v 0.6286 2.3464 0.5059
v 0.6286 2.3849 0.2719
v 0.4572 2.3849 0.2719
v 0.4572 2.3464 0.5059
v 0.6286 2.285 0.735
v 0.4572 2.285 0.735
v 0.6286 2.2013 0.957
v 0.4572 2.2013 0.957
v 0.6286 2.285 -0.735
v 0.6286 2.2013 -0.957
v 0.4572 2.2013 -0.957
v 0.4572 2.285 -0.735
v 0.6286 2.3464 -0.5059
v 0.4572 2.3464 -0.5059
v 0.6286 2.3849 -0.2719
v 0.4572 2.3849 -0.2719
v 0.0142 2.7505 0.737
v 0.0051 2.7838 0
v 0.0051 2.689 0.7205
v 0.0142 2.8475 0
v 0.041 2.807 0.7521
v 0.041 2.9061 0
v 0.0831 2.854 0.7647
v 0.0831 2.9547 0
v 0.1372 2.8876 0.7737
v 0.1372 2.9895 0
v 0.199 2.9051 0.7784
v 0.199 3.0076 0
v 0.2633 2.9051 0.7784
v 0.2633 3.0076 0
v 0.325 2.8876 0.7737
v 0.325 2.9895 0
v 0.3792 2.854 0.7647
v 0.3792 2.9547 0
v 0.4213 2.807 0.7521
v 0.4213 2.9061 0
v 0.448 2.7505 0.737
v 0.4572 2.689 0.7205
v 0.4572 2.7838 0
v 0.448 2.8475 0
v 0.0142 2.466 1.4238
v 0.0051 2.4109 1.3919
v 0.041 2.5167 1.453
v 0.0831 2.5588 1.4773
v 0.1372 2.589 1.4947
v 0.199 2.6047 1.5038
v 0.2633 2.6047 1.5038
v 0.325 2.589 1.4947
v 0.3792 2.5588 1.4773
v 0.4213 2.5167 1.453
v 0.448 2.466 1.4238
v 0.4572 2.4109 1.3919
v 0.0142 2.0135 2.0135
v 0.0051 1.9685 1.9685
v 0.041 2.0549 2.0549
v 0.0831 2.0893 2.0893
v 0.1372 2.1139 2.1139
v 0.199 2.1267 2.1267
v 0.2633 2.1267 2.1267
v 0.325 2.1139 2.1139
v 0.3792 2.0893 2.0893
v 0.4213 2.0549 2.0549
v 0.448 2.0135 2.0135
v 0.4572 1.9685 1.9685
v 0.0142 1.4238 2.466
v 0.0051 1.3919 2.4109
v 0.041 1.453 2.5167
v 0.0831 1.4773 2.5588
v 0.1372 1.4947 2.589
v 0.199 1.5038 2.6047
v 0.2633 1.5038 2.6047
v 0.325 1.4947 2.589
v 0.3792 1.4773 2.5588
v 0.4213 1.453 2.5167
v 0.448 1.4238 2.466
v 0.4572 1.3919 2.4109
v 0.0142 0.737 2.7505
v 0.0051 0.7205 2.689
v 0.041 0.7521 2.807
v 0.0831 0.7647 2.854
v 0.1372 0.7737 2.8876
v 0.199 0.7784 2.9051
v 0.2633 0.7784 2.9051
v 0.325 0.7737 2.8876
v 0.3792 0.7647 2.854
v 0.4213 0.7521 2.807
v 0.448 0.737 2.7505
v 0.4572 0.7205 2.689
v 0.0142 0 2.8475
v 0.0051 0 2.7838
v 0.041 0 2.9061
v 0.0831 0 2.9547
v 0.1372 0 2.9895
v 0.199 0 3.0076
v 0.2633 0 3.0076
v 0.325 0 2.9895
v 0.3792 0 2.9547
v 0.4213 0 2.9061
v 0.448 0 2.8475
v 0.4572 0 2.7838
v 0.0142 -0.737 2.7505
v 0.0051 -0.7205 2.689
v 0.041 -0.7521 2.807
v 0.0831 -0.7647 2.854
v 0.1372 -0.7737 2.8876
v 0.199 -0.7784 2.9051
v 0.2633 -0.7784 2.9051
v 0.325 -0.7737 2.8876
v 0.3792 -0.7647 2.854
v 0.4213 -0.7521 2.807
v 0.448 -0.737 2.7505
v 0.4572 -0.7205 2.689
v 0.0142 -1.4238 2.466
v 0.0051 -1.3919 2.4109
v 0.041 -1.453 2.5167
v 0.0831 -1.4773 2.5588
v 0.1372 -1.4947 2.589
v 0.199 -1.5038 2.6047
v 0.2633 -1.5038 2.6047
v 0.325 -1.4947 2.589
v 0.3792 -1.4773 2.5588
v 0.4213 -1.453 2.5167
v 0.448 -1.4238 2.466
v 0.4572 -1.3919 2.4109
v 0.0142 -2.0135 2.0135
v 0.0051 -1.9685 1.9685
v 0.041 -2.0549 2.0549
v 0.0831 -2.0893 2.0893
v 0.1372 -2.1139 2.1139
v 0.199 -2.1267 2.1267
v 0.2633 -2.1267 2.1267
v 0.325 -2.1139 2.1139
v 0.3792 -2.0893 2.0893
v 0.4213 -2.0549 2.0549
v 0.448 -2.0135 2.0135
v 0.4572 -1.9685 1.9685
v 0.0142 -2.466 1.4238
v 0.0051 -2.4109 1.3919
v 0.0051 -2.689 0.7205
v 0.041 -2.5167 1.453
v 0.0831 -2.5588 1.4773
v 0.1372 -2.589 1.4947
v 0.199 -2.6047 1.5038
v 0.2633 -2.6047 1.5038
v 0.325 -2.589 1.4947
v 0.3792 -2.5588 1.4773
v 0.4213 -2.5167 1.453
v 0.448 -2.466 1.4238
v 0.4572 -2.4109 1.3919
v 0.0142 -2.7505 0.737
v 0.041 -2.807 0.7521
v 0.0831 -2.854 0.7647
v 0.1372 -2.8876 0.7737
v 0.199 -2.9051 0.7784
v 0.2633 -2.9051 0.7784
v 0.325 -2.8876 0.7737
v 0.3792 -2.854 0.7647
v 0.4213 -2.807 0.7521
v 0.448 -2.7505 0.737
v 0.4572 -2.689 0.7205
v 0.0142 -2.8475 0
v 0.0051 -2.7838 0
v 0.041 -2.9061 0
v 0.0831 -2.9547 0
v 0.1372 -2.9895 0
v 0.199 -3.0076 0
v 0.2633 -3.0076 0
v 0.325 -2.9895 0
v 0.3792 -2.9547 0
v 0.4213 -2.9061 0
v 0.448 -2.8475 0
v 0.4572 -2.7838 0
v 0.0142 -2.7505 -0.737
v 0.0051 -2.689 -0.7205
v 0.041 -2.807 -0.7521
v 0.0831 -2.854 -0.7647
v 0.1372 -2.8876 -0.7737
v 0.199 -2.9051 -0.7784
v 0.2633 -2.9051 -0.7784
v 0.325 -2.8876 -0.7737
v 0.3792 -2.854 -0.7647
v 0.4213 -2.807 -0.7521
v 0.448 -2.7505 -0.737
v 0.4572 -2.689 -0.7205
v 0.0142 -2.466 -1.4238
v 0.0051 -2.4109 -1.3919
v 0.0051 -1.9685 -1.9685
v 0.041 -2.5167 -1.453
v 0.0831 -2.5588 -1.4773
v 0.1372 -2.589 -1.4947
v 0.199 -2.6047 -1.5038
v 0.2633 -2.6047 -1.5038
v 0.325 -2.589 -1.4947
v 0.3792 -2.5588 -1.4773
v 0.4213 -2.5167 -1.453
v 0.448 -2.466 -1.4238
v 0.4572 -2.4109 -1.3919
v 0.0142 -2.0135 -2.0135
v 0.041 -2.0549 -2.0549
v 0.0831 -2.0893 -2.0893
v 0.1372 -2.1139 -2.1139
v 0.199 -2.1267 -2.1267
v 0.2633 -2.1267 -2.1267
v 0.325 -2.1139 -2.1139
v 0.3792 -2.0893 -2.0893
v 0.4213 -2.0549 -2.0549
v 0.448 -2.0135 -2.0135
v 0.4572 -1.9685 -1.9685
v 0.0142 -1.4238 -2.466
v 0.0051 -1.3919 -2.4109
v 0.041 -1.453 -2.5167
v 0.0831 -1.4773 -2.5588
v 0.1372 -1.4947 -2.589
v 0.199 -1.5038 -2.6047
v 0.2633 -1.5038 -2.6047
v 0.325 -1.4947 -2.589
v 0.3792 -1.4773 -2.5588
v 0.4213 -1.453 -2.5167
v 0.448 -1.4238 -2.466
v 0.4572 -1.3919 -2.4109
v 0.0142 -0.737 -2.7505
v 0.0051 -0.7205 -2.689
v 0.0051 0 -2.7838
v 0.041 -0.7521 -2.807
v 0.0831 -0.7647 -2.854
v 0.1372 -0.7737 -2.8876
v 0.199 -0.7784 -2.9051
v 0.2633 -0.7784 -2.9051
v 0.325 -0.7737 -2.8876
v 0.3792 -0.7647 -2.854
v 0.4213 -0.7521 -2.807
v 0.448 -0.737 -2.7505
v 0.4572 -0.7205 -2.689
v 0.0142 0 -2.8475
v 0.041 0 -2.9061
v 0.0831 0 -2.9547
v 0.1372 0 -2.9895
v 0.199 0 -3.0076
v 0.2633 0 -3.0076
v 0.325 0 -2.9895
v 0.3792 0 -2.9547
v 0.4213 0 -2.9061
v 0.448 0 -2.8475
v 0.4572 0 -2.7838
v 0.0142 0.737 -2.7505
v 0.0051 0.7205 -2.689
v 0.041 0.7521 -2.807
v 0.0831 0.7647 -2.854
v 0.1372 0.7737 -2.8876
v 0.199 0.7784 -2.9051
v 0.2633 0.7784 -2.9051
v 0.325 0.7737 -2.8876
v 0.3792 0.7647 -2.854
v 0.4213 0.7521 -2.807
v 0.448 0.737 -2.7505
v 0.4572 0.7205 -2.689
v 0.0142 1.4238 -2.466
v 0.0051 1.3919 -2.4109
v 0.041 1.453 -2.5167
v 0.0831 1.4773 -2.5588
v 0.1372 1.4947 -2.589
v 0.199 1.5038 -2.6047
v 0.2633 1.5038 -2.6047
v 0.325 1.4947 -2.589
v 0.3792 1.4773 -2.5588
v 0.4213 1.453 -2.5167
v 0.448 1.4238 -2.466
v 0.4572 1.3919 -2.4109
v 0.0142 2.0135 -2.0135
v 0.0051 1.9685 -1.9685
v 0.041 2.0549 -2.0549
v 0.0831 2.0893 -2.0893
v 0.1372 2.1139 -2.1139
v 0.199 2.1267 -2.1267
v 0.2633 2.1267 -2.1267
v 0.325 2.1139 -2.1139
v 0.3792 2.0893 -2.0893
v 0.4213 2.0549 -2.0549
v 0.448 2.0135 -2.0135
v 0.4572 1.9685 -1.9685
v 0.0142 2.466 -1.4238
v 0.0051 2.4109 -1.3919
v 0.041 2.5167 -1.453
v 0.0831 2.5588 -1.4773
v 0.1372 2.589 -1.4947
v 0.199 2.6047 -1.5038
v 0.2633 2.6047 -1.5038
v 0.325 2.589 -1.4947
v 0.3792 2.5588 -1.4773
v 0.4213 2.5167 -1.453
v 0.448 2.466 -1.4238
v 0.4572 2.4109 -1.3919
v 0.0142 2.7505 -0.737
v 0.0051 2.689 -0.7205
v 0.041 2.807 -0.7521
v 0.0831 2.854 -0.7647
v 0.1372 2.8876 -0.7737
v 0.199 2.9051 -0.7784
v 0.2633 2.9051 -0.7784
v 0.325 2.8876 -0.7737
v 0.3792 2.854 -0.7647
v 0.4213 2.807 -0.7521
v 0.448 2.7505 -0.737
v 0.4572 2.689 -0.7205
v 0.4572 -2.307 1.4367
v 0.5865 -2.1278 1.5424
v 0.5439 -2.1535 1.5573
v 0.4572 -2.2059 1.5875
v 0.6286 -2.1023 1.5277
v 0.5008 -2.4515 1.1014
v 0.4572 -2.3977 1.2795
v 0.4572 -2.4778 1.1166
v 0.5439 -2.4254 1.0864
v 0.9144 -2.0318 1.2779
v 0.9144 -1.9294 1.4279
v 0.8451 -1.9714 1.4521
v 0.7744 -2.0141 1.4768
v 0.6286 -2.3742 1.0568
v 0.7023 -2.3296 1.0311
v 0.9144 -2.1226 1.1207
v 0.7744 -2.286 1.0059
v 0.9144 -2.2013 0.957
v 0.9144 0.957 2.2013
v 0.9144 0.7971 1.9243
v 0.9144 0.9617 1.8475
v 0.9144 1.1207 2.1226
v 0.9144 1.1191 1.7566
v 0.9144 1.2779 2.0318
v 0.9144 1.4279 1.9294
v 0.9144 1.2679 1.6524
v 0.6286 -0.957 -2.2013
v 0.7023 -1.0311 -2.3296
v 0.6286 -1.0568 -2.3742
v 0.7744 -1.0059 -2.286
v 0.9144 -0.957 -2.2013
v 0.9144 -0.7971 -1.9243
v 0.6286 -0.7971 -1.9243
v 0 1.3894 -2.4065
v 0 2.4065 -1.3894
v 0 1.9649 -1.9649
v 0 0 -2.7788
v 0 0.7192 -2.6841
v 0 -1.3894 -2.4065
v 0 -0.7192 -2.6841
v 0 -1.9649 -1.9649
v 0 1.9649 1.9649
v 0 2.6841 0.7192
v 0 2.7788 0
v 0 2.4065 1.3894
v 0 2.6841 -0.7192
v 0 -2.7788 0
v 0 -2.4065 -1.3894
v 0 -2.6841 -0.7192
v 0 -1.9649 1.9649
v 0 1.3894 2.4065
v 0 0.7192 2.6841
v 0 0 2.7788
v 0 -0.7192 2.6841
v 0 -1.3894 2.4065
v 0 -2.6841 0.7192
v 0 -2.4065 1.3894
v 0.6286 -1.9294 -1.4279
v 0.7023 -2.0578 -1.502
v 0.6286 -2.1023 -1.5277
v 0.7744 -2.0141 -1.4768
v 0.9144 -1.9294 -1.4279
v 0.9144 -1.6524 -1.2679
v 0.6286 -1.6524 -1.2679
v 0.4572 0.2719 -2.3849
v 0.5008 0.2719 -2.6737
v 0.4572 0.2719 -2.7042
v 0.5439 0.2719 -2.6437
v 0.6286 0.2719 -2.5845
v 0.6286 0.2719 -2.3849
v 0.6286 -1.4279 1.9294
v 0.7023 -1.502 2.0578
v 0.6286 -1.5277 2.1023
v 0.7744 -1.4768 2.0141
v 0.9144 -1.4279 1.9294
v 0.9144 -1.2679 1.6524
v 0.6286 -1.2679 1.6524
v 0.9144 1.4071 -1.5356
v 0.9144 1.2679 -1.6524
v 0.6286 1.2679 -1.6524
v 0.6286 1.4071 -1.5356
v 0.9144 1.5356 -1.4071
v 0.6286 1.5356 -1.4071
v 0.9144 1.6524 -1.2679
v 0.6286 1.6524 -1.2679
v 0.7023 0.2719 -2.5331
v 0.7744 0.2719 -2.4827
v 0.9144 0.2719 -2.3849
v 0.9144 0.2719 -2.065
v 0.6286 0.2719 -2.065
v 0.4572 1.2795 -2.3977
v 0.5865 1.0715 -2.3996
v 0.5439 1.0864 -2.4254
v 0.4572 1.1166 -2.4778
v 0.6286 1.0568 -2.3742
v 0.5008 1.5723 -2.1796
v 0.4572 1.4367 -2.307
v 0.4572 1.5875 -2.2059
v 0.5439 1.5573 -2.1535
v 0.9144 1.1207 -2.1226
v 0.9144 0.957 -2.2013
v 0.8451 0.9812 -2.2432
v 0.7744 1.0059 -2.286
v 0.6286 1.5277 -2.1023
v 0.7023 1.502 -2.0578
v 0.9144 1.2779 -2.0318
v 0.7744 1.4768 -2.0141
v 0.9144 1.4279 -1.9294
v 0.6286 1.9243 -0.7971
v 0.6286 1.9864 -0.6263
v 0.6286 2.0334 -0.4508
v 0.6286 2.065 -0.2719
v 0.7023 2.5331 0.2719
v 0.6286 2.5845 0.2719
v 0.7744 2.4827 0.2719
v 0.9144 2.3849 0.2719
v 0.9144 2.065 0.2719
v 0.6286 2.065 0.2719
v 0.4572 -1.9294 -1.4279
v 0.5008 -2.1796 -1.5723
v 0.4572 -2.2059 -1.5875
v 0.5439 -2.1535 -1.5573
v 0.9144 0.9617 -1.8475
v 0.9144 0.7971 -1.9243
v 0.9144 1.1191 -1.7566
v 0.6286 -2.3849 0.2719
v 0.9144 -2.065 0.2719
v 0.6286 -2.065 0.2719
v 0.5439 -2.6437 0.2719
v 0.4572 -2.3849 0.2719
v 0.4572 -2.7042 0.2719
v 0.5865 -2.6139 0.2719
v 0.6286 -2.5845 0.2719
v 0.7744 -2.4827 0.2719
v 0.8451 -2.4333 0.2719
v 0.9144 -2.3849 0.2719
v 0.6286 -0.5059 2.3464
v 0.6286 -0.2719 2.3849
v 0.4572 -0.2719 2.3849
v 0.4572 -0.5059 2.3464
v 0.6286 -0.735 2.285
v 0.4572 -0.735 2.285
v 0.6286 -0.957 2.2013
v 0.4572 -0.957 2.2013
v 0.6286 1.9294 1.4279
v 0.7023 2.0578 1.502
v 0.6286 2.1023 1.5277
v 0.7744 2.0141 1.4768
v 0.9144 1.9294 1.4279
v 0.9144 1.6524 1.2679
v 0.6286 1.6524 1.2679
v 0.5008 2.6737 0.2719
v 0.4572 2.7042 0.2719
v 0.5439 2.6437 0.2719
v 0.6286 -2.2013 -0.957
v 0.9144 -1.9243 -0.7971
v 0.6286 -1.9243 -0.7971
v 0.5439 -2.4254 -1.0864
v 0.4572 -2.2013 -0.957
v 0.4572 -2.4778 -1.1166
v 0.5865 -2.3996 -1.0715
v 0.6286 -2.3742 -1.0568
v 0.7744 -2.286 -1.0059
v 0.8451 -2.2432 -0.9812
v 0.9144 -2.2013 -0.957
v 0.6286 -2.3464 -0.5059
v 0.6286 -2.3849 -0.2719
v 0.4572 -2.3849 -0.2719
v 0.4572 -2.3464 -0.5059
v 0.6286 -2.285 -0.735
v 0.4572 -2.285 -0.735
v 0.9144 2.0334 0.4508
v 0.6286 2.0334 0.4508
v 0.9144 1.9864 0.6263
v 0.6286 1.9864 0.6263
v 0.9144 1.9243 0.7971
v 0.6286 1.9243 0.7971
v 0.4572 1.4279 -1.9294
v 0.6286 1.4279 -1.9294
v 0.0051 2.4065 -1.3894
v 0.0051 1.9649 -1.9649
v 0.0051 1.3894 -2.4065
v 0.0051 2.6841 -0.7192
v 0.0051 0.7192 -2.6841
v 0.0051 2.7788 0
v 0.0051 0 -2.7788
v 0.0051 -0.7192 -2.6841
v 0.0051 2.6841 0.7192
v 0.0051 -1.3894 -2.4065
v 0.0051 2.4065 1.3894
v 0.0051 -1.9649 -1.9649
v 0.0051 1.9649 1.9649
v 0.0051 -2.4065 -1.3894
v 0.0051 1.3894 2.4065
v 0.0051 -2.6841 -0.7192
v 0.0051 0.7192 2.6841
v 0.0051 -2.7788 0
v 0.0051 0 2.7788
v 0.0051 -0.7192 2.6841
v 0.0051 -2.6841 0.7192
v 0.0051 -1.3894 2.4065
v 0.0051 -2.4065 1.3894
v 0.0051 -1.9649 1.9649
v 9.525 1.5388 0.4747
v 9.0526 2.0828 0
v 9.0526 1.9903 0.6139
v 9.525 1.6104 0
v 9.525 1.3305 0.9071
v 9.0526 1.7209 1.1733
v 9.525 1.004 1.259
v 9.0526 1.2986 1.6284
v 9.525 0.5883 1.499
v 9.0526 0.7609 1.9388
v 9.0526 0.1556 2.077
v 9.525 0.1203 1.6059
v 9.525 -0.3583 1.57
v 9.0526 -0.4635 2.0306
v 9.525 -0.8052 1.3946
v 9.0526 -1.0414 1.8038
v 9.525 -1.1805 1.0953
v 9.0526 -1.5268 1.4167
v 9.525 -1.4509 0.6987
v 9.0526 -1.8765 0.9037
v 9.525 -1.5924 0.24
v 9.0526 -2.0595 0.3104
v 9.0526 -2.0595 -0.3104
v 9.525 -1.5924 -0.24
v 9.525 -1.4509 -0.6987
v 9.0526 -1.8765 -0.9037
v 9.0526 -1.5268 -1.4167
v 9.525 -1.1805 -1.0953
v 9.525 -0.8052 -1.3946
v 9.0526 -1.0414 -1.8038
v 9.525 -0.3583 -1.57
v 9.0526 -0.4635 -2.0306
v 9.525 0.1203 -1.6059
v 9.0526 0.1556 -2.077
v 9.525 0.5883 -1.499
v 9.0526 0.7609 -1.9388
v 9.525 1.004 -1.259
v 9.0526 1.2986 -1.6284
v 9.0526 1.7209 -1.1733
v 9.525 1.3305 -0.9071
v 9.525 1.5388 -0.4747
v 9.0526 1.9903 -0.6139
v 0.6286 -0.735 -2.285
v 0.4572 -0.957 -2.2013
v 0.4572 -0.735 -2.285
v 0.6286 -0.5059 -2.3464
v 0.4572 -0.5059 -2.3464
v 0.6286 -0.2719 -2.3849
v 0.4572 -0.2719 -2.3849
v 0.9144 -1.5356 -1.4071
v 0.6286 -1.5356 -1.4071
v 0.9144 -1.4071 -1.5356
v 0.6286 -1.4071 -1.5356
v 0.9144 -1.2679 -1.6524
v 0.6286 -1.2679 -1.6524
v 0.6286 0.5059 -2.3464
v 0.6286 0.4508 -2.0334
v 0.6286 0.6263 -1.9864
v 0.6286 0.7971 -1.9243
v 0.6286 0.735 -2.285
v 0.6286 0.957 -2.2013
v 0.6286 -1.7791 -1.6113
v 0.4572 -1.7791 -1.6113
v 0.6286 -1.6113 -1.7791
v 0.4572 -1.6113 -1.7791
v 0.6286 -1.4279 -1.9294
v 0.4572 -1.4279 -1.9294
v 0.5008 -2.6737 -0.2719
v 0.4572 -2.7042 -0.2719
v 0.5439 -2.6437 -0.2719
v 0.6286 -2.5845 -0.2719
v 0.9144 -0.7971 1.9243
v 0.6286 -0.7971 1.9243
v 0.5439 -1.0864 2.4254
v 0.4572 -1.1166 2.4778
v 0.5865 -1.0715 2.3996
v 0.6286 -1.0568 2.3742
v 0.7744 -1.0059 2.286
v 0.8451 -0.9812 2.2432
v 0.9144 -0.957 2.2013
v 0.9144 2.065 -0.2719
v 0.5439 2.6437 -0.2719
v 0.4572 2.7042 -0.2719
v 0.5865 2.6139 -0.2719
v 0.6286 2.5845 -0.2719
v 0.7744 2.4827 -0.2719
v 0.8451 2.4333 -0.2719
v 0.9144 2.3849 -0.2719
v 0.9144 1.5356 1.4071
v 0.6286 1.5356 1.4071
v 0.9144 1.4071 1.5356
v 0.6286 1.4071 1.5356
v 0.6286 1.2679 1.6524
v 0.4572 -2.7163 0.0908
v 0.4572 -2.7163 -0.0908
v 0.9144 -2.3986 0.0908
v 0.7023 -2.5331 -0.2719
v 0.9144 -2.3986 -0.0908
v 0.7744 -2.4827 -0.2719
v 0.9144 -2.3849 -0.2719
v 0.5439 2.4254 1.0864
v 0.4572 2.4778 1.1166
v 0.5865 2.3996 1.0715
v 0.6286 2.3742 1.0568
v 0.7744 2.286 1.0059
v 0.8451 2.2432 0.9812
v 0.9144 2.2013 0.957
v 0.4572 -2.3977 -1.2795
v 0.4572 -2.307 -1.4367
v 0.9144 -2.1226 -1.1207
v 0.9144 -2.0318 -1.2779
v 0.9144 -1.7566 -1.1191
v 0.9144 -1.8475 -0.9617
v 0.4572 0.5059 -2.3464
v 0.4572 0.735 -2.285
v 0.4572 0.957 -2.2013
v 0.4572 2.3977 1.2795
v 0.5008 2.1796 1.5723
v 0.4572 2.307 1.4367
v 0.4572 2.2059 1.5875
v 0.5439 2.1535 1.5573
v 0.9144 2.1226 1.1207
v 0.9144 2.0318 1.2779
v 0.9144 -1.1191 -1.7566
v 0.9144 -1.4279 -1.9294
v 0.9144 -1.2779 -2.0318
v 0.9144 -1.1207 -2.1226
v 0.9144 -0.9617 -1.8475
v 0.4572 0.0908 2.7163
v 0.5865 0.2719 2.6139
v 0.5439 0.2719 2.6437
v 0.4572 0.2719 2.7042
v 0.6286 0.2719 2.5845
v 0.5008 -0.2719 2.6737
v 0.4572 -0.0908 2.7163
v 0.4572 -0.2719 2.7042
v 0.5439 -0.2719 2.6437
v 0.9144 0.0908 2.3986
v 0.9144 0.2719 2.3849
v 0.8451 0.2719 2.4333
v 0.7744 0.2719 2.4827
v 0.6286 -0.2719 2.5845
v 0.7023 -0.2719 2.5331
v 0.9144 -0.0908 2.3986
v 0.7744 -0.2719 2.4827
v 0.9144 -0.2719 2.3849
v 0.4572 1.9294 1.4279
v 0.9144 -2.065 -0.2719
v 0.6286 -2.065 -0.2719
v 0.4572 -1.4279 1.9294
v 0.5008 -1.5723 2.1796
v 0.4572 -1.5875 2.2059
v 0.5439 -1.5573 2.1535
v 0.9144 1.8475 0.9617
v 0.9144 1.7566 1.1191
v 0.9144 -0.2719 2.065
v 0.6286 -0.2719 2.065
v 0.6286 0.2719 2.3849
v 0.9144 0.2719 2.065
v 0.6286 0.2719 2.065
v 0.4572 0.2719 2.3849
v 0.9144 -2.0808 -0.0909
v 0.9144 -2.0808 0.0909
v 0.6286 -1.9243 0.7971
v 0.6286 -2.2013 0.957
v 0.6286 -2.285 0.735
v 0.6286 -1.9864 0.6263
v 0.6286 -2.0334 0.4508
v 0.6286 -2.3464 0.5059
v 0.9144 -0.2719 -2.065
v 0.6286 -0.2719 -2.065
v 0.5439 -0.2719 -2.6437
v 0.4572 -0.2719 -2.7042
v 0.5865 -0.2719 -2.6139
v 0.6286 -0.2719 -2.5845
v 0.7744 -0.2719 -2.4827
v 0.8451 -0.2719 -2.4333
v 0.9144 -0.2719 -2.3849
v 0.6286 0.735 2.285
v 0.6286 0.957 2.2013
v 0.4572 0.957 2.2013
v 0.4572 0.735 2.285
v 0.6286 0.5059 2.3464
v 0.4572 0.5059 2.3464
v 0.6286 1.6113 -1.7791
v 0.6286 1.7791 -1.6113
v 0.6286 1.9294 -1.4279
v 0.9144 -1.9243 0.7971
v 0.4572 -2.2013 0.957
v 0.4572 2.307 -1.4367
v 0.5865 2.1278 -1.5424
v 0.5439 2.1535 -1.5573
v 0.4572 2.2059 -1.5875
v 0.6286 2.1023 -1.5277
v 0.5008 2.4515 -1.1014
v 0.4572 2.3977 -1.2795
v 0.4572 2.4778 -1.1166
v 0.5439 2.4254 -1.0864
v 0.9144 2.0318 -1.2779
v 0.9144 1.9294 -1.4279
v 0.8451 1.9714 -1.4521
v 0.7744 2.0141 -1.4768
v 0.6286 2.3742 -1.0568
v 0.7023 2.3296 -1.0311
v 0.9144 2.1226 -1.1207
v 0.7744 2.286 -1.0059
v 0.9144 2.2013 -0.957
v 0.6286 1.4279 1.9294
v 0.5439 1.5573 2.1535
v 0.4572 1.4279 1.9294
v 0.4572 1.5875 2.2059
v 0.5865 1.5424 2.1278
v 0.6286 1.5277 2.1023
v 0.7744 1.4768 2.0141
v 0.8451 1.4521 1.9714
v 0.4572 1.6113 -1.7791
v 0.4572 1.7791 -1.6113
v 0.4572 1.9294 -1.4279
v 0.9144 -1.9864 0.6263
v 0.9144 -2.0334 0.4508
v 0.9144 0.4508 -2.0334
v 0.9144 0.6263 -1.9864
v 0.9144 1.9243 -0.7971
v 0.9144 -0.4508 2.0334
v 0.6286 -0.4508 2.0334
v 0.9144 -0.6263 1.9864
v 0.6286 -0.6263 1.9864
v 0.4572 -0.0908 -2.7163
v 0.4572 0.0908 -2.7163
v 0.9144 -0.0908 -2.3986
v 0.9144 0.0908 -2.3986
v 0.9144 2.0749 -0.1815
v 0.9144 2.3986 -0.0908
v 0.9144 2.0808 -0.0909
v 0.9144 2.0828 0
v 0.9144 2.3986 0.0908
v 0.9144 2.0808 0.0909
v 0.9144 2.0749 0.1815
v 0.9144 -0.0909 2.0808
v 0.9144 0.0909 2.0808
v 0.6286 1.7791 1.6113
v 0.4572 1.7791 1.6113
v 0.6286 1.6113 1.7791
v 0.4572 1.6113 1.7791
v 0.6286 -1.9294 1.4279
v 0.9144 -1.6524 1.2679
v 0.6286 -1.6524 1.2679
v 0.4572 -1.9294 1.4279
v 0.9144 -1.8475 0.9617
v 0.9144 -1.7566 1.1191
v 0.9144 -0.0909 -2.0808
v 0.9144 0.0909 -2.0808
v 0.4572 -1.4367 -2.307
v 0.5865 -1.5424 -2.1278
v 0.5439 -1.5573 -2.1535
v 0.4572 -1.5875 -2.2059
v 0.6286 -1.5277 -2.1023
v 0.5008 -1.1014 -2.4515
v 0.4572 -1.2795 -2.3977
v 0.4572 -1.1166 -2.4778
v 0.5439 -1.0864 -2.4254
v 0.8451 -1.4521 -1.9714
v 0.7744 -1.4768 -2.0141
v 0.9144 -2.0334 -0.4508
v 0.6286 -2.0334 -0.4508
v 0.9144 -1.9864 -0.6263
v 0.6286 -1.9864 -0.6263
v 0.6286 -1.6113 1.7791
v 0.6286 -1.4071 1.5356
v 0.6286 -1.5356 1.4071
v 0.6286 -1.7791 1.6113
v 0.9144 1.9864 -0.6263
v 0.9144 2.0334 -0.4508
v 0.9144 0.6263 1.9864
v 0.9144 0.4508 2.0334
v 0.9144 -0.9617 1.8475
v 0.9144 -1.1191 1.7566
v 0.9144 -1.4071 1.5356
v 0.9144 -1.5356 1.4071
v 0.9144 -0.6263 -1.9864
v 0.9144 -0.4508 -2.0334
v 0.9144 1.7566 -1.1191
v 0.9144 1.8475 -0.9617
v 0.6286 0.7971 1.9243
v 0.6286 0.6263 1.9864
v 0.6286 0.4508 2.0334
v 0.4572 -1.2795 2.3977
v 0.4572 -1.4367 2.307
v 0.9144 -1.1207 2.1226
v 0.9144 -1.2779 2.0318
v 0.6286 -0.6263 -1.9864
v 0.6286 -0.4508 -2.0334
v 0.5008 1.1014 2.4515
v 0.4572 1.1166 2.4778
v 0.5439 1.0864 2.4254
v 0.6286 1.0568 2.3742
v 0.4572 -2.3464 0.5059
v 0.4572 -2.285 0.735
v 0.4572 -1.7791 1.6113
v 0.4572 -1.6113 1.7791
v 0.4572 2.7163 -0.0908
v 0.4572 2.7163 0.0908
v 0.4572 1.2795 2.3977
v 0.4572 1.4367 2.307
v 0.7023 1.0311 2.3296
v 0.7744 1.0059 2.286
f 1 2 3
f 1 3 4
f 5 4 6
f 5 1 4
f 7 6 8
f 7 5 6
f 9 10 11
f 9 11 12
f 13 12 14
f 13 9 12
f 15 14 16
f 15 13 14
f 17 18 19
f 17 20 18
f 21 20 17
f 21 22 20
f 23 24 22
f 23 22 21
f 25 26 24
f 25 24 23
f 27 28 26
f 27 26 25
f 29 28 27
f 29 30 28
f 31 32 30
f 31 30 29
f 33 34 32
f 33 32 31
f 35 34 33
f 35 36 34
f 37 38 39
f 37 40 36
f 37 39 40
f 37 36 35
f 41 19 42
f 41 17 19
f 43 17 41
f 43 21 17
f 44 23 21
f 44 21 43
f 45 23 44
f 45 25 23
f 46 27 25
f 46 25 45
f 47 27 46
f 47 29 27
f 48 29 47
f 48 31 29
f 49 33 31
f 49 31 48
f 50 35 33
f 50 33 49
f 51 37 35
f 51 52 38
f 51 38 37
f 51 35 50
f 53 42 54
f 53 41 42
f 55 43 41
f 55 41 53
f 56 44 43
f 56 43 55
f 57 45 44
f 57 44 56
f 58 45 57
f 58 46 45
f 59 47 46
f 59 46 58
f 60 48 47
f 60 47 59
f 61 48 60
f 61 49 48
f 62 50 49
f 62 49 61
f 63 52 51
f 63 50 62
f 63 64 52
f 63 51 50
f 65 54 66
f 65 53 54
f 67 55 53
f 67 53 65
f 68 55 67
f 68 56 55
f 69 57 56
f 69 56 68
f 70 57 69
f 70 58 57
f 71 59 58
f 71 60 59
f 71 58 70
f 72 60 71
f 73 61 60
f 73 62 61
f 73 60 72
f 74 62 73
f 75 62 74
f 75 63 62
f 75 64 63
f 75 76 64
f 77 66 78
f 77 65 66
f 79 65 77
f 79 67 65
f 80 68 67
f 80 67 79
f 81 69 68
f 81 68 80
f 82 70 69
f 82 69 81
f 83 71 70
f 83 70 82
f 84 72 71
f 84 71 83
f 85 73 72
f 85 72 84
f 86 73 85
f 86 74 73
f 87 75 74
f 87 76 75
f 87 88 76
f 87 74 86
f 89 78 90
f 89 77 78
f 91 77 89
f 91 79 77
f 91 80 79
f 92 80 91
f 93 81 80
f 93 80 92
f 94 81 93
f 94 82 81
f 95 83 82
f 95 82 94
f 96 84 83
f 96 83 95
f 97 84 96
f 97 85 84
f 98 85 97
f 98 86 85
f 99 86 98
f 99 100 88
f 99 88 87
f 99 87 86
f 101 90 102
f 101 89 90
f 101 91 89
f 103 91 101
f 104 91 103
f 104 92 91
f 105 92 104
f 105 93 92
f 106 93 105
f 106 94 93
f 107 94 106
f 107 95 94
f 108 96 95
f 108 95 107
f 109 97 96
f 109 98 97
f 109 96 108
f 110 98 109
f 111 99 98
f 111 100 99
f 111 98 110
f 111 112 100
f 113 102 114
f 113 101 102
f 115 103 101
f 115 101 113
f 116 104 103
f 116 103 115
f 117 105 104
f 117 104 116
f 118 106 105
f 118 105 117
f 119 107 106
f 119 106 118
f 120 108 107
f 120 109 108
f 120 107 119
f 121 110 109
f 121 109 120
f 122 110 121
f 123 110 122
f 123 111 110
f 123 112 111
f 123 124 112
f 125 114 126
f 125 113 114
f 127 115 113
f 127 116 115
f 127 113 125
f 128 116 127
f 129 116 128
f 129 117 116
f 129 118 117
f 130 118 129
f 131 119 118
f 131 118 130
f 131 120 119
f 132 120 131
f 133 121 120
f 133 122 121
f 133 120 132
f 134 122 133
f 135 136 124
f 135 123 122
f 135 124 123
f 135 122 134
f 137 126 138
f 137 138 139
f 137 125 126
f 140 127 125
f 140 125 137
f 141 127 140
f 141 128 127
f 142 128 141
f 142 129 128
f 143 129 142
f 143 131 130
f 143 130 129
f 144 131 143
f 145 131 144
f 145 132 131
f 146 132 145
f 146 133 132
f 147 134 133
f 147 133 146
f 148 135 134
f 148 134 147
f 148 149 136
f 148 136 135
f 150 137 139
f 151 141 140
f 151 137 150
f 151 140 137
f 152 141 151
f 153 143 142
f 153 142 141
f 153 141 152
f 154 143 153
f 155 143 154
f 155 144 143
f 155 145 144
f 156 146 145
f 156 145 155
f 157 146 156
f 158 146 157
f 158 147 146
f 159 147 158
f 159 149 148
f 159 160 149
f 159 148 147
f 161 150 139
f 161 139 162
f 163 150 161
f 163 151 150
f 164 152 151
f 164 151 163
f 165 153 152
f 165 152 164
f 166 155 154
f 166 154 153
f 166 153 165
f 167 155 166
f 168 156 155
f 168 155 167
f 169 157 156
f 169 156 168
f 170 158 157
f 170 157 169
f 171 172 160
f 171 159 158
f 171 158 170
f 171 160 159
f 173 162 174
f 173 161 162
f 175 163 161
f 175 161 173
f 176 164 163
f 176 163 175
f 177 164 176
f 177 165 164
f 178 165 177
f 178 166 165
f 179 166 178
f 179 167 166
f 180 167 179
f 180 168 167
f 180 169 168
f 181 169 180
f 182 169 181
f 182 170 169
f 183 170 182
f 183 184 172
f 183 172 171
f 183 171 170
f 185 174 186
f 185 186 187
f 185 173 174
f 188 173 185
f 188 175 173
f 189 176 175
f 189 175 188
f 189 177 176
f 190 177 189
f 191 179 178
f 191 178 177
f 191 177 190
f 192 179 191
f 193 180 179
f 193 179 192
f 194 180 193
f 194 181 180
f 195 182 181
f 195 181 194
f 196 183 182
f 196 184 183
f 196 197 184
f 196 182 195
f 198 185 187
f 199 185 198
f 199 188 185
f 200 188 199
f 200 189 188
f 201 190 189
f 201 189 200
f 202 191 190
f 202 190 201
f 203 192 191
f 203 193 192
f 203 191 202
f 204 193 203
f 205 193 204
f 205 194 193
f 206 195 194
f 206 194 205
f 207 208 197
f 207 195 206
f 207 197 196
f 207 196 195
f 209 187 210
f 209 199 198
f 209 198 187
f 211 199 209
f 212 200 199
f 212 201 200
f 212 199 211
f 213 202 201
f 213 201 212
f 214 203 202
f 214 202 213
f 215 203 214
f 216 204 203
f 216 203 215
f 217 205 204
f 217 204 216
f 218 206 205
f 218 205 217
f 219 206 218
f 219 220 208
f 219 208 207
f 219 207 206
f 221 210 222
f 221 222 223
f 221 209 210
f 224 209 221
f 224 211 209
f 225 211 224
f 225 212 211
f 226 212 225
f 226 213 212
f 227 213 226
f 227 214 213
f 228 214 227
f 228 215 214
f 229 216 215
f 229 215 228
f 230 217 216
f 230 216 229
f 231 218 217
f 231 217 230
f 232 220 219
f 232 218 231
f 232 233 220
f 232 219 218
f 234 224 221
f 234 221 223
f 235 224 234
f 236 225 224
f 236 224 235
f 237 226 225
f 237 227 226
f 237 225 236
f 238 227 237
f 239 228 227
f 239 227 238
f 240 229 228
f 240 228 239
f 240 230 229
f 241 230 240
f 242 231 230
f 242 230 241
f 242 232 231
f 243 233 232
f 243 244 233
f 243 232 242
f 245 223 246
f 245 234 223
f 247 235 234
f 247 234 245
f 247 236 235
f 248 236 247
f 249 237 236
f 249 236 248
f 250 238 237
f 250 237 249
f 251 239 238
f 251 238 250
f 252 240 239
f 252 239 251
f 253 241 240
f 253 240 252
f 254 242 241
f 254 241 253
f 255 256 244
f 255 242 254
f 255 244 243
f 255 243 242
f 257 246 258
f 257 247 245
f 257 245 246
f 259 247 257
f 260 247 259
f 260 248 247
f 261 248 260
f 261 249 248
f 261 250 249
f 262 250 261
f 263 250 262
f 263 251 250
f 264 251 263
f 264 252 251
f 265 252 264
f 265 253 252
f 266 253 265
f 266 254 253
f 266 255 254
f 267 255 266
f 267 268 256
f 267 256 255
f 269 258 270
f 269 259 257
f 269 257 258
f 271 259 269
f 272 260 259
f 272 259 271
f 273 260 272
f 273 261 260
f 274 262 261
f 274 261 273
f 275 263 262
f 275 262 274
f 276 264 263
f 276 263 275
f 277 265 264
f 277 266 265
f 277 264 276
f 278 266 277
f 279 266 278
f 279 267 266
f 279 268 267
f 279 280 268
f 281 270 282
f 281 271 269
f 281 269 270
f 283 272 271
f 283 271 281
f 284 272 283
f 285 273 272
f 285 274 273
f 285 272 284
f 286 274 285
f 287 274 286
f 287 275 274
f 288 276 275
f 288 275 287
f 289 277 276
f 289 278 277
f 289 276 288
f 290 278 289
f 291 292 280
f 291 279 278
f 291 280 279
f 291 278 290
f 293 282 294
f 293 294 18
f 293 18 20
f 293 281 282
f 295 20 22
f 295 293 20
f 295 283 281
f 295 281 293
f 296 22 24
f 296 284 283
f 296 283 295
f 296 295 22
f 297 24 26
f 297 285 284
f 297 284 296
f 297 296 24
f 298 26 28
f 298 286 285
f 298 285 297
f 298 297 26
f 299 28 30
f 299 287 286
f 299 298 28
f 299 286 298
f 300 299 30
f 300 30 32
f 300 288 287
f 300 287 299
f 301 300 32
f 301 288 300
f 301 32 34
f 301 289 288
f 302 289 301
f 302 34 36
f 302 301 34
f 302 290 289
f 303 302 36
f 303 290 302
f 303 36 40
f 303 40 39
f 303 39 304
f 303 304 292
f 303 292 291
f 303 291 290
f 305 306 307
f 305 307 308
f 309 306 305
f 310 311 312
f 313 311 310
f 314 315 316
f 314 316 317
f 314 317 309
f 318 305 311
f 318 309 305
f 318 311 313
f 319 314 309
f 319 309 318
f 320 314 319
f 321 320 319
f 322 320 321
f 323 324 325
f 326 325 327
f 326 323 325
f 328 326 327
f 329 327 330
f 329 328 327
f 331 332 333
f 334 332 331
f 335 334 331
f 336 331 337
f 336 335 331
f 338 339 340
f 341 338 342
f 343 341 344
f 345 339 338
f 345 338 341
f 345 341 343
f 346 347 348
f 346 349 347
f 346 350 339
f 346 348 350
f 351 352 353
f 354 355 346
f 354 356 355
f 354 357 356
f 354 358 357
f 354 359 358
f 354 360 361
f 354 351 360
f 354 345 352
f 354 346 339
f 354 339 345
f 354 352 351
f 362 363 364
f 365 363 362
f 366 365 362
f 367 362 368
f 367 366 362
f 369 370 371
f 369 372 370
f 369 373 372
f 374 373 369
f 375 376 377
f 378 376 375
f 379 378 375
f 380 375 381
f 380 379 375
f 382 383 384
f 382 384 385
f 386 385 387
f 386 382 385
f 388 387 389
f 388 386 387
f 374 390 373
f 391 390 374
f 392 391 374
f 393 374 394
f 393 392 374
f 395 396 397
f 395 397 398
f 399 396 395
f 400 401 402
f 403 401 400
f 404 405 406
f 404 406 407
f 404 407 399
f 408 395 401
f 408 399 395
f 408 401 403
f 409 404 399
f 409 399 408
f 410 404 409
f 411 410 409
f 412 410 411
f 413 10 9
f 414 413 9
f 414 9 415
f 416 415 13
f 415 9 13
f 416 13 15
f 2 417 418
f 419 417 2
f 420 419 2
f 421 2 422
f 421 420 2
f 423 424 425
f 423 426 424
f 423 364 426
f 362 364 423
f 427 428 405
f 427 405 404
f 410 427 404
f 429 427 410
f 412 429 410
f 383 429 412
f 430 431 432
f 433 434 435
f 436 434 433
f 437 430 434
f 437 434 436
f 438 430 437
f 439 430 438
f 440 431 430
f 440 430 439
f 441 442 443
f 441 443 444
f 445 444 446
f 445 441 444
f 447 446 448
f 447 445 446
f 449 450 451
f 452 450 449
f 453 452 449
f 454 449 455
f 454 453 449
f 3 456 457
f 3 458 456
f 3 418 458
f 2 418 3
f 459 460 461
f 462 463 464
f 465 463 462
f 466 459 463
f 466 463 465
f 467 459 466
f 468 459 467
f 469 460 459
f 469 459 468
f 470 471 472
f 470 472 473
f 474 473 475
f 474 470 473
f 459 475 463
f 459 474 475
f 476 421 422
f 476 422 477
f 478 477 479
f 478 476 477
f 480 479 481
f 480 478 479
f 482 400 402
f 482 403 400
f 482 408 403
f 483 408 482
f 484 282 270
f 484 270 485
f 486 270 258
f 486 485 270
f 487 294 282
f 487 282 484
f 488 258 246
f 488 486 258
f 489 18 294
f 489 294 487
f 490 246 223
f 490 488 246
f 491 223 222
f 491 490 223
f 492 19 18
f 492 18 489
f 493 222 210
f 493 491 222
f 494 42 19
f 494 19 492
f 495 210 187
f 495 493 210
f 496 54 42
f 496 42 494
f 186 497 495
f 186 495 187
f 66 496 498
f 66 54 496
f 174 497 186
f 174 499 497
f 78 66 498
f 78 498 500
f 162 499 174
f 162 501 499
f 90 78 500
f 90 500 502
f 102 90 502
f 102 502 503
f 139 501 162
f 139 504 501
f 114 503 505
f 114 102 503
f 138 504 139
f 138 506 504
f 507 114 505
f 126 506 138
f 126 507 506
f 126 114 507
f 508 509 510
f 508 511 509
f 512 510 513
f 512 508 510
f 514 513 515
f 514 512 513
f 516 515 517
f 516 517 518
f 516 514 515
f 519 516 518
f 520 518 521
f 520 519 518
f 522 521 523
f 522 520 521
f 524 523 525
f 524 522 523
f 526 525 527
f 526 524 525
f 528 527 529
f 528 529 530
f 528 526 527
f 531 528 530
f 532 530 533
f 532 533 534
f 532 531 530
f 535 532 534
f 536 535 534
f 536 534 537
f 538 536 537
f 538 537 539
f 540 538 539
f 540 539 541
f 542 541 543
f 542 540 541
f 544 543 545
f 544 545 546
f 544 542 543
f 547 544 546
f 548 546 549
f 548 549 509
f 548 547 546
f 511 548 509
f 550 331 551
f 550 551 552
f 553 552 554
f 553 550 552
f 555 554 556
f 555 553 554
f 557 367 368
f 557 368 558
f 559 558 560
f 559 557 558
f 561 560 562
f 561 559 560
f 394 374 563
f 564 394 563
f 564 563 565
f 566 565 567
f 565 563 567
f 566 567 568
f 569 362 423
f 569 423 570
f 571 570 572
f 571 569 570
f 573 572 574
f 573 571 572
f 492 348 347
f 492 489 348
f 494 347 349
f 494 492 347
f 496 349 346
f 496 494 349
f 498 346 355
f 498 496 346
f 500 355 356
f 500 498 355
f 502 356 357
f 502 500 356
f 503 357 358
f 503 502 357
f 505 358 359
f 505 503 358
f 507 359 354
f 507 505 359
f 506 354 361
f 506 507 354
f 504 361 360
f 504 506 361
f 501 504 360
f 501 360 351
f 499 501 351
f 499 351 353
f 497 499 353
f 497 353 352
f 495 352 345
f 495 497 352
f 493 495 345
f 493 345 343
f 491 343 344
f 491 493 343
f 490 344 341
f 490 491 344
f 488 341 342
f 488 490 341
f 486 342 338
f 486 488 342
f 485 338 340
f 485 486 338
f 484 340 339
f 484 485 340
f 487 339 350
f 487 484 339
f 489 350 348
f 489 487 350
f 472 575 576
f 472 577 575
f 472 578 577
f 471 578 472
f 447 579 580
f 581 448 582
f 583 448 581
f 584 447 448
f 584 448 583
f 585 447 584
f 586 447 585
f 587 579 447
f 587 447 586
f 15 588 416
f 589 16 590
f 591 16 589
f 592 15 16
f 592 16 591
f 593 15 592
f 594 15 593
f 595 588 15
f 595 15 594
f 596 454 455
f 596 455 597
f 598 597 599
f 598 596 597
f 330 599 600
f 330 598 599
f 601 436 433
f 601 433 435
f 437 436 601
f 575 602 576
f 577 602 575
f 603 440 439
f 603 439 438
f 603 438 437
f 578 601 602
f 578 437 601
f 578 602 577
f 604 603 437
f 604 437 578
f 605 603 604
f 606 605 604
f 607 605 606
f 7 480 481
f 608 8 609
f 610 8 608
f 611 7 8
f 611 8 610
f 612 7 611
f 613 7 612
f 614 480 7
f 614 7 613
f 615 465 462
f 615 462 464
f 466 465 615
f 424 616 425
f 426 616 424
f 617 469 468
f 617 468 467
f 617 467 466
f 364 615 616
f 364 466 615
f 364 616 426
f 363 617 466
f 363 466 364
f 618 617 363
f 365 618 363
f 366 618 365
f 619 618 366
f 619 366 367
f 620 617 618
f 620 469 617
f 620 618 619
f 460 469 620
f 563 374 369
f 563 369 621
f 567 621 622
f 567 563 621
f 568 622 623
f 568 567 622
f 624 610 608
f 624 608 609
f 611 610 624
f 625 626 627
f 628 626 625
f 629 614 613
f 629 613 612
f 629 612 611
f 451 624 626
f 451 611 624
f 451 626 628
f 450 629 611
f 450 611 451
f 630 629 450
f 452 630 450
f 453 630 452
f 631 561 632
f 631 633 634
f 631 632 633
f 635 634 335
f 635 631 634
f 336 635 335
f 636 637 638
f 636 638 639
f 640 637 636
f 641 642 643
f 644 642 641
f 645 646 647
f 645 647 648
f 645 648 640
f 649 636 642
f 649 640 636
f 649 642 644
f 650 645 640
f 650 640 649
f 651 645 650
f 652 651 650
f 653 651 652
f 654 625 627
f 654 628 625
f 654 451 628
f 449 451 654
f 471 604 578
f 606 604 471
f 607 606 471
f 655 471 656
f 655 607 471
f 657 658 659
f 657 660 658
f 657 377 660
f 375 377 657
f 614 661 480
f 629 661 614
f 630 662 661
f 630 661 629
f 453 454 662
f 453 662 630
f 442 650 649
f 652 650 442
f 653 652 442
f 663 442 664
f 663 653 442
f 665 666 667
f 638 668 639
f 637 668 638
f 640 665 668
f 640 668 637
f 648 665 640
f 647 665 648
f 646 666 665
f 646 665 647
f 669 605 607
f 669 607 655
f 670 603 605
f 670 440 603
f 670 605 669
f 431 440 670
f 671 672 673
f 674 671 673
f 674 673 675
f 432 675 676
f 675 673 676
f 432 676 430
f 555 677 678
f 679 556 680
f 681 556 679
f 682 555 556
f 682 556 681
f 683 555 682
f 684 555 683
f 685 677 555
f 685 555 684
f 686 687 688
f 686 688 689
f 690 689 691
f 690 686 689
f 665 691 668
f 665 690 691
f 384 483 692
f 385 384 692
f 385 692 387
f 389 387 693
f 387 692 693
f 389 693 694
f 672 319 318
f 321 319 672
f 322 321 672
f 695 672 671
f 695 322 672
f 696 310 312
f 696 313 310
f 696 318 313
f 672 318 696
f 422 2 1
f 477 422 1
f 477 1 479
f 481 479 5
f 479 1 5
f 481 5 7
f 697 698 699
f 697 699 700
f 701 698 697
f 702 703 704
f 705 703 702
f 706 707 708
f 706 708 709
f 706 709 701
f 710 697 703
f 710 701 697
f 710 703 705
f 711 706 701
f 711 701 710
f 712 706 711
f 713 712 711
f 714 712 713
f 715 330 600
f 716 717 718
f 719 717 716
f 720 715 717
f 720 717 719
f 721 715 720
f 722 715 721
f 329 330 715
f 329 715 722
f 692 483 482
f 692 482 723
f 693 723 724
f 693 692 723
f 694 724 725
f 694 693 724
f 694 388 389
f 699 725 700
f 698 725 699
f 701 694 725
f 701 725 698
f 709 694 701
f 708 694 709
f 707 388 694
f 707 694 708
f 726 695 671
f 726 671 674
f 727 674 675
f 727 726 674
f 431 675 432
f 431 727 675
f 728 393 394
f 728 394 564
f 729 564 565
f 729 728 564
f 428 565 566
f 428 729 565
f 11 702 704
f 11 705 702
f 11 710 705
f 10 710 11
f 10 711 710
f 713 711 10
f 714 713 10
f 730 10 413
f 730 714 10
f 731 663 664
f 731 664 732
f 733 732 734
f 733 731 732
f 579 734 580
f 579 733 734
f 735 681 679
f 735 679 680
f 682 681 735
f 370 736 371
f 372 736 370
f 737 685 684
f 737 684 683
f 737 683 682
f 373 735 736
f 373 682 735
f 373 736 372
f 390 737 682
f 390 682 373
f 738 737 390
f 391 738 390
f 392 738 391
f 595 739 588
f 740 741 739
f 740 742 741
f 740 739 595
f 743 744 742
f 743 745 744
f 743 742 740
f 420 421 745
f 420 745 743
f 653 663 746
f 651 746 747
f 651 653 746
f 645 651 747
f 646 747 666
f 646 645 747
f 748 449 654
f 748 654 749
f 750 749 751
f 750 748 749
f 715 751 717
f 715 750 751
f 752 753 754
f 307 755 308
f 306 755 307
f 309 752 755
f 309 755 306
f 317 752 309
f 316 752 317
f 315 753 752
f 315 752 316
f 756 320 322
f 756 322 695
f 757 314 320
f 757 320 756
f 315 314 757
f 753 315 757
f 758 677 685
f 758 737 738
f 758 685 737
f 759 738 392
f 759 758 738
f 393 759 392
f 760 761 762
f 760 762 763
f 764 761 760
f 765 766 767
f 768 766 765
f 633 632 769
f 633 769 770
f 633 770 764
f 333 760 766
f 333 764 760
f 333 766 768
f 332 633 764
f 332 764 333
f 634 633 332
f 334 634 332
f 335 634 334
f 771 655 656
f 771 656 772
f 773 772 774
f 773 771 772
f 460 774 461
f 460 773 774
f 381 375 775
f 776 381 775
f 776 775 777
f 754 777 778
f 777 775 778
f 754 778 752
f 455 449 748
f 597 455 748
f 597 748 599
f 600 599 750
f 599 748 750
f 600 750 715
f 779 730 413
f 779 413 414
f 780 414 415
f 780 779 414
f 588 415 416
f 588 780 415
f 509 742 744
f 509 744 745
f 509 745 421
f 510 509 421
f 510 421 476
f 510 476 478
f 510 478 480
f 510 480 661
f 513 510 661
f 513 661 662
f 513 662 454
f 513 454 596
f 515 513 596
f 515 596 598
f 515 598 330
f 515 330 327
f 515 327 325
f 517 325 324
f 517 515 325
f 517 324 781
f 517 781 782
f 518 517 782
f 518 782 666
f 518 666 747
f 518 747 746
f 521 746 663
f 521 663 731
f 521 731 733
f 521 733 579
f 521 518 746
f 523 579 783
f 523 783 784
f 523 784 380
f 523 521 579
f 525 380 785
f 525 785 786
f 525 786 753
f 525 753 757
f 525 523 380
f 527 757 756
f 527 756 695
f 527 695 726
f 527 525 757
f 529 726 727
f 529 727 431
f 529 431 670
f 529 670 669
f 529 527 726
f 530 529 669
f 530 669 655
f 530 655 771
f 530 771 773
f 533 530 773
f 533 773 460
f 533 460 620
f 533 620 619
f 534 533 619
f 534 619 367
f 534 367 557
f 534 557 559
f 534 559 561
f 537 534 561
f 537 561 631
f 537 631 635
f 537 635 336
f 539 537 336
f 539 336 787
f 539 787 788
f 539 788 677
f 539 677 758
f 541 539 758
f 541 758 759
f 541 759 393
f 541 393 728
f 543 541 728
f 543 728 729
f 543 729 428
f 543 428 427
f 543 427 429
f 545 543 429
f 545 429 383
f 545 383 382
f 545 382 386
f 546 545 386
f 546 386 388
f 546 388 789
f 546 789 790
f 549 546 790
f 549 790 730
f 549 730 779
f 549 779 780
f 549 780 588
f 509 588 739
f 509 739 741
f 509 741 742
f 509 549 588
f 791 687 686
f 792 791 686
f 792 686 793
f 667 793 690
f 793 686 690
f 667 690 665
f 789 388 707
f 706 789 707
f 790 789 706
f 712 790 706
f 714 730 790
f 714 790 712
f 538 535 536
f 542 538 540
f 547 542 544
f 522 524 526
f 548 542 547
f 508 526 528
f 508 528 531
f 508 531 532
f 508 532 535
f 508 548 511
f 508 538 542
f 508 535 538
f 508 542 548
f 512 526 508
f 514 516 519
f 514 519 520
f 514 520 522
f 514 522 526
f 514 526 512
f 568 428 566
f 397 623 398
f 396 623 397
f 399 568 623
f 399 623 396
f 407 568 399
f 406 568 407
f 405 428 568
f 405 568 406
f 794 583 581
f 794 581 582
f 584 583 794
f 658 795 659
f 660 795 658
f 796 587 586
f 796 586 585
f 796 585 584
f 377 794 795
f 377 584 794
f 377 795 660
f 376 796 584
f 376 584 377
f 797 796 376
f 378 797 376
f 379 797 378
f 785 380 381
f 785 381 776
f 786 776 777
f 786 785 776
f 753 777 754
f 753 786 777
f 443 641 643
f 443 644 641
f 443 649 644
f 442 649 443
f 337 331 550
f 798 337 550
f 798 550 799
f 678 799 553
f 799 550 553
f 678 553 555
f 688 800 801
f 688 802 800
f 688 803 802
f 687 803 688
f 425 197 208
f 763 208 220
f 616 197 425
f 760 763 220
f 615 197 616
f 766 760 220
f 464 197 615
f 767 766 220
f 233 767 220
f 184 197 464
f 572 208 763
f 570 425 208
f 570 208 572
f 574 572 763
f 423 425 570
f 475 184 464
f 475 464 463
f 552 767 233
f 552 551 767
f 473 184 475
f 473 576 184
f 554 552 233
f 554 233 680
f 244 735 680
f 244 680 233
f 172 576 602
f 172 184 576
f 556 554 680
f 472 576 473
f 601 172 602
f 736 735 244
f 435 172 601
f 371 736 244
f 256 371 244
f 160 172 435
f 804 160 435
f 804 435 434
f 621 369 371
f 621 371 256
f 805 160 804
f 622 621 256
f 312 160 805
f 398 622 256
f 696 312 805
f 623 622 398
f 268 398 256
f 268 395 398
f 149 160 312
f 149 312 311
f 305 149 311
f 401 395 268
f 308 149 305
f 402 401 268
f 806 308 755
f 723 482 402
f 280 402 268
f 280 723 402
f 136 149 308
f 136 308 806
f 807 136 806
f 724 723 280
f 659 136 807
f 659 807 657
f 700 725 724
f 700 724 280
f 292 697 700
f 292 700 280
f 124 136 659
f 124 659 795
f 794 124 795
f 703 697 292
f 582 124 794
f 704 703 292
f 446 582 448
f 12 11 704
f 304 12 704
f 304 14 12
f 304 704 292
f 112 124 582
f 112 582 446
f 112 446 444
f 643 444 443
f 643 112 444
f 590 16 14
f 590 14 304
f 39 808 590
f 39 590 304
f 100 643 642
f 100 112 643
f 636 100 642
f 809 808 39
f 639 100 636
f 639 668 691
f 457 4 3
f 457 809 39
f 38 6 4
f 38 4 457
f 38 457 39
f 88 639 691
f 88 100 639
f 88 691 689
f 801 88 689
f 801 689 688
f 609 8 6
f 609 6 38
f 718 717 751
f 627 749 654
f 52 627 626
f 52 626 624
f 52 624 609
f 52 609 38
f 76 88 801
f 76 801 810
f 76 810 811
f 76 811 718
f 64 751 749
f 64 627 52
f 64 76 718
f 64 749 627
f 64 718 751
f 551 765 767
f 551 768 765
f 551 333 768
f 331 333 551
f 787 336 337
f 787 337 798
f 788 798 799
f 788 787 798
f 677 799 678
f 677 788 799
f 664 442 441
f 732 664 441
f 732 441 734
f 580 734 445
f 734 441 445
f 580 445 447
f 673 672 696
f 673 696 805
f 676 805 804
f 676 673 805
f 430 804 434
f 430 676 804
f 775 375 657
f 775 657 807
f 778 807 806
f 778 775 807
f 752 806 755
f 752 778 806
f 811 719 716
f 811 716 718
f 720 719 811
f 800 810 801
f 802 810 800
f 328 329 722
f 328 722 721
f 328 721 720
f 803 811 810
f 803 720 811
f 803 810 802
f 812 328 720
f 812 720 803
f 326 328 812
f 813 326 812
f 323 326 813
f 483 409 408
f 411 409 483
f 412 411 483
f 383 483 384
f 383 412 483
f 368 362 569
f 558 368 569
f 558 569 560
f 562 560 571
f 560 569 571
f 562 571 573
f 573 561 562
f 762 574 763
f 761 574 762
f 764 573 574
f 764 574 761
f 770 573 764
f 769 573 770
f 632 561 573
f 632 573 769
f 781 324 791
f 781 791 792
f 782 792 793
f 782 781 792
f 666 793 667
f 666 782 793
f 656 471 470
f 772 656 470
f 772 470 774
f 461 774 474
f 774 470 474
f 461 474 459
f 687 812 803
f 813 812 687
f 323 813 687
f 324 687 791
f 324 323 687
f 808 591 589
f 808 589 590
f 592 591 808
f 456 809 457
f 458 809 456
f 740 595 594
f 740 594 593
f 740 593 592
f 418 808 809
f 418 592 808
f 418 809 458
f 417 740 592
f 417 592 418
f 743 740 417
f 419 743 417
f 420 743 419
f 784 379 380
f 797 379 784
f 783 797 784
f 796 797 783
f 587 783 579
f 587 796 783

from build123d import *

# Parameters (mm, degrees)
RIBCUT1_DEPTH    = 0.28575
RIBCUT2_DEPTH    = 0.4572
RIBCUTSPAT_COUNT = 12
RIBCUTSPAT_ANGLE = 330


with BuildPart() as part:
    # BodySke → BaseBody (revolve)
    with BuildSketch(Plane.XY):
        with BuildLine():
            Line((0, 0), (0, 2.77876))
            Line((0, 2.77876), (0.00508, 2.77876))
            Line((0.00508, 2.77876), (0.00508, 2.78384))
            ThreePointArc((0.00508, 2.78384), (0.23114, 3.0099), (0.4572, 2.78384))
            Line((0.4572, 2.78384), (0.4572, 2.7178))
            Line((0.4572, 2.7178), (0.9144, 2.4003))
            Line((0.9144, 2.4003), (0.9144, 2.0828))
            Line((0.9144, 2.0828), (9.05256, 2.0828))
            Line((9.05256, 2.0828), (9.525, 1.61036))
            Line((9.525, 1.61036), (9.525, 0))
            Line((9.525, 0), (0, 0))
        make_face()
    revolve(axis=Axis((0, 0, 0), (1, 0, 0)))

    # RibCut1Ske → RibCut1 (cut)
    with BuildSketch(Plane(origin=(0.9144, 0, 0), x_dir=(0, 0, -1), z_dir=(1, 0, 0))):
        with BuildLine():
            Line((0.271859953, 2.064981357), (0.271859953, 2.997597401))
            ThreePointArc((0.271859953, 2.997597401), (0.779019444, 2.907340145), (1.263361075, 2.731925476))
            Line((1.263361075, 2.731925476), (0.797053053, 1.92425629))
            ThreePointArc((0.797053053, 1.92425629), (0.539068307, 2.011830311), (0.271859953, 2.064981357))
        make_face()
    ribcut1 = extrude(amount=-RIBCUT1_DEPTH, mode=Mode.SUBTRACT)

    # RibCut2Ske → RibCut2 (cut)
    with BuildSketch(Plane(origin=(0.9144, 0, 0), x_dir=(0, 0, -1), z_dir=(1, 0, 0))):
        with BuildLine():
            Line((0.271859953, 2.384854766), (0.271859953, 2.997597401))
            ThreePointArc((0.271859953, 2.997597401), (0.779019444, 2.907340145), (1.263361075, 2.731925476))
            Line((1.263361075, 2.731925476), (0.956989757, 2.201274788))
            ThreePointArc((0.956989757, 2.201274788), (0.621243354, 2.318511761), (0.271859953, 2.384854766))
        make_face()
    ribcut2 = extrude(amount=-RIBCUT2_DEPTH, mode=Mode.SUBTRACT)

    # RibCutsPat: RibCut1, RibCut2 ×12 about axis
    ribcutspat_axis = Axis((0, 0, 0), (1, 0, 0))
    for i in range(1, RIBCUTSPAT_COUNT):
        add(ribcut1.rotate(ribcutspat_axis, i * RIBCUTSPAT_ANGLE / (RIBCUTSPAT_COUNT - 1)), mode=Mode.SUBTRACT)
        add(ribcut2.rotate(ribcutspat_axis, i * RIBCUTSPAT_ANGLE / (RIBCUTSPAT_COUNT - 1)), mode=Mode.SUBTRACT)


solid = part.part
